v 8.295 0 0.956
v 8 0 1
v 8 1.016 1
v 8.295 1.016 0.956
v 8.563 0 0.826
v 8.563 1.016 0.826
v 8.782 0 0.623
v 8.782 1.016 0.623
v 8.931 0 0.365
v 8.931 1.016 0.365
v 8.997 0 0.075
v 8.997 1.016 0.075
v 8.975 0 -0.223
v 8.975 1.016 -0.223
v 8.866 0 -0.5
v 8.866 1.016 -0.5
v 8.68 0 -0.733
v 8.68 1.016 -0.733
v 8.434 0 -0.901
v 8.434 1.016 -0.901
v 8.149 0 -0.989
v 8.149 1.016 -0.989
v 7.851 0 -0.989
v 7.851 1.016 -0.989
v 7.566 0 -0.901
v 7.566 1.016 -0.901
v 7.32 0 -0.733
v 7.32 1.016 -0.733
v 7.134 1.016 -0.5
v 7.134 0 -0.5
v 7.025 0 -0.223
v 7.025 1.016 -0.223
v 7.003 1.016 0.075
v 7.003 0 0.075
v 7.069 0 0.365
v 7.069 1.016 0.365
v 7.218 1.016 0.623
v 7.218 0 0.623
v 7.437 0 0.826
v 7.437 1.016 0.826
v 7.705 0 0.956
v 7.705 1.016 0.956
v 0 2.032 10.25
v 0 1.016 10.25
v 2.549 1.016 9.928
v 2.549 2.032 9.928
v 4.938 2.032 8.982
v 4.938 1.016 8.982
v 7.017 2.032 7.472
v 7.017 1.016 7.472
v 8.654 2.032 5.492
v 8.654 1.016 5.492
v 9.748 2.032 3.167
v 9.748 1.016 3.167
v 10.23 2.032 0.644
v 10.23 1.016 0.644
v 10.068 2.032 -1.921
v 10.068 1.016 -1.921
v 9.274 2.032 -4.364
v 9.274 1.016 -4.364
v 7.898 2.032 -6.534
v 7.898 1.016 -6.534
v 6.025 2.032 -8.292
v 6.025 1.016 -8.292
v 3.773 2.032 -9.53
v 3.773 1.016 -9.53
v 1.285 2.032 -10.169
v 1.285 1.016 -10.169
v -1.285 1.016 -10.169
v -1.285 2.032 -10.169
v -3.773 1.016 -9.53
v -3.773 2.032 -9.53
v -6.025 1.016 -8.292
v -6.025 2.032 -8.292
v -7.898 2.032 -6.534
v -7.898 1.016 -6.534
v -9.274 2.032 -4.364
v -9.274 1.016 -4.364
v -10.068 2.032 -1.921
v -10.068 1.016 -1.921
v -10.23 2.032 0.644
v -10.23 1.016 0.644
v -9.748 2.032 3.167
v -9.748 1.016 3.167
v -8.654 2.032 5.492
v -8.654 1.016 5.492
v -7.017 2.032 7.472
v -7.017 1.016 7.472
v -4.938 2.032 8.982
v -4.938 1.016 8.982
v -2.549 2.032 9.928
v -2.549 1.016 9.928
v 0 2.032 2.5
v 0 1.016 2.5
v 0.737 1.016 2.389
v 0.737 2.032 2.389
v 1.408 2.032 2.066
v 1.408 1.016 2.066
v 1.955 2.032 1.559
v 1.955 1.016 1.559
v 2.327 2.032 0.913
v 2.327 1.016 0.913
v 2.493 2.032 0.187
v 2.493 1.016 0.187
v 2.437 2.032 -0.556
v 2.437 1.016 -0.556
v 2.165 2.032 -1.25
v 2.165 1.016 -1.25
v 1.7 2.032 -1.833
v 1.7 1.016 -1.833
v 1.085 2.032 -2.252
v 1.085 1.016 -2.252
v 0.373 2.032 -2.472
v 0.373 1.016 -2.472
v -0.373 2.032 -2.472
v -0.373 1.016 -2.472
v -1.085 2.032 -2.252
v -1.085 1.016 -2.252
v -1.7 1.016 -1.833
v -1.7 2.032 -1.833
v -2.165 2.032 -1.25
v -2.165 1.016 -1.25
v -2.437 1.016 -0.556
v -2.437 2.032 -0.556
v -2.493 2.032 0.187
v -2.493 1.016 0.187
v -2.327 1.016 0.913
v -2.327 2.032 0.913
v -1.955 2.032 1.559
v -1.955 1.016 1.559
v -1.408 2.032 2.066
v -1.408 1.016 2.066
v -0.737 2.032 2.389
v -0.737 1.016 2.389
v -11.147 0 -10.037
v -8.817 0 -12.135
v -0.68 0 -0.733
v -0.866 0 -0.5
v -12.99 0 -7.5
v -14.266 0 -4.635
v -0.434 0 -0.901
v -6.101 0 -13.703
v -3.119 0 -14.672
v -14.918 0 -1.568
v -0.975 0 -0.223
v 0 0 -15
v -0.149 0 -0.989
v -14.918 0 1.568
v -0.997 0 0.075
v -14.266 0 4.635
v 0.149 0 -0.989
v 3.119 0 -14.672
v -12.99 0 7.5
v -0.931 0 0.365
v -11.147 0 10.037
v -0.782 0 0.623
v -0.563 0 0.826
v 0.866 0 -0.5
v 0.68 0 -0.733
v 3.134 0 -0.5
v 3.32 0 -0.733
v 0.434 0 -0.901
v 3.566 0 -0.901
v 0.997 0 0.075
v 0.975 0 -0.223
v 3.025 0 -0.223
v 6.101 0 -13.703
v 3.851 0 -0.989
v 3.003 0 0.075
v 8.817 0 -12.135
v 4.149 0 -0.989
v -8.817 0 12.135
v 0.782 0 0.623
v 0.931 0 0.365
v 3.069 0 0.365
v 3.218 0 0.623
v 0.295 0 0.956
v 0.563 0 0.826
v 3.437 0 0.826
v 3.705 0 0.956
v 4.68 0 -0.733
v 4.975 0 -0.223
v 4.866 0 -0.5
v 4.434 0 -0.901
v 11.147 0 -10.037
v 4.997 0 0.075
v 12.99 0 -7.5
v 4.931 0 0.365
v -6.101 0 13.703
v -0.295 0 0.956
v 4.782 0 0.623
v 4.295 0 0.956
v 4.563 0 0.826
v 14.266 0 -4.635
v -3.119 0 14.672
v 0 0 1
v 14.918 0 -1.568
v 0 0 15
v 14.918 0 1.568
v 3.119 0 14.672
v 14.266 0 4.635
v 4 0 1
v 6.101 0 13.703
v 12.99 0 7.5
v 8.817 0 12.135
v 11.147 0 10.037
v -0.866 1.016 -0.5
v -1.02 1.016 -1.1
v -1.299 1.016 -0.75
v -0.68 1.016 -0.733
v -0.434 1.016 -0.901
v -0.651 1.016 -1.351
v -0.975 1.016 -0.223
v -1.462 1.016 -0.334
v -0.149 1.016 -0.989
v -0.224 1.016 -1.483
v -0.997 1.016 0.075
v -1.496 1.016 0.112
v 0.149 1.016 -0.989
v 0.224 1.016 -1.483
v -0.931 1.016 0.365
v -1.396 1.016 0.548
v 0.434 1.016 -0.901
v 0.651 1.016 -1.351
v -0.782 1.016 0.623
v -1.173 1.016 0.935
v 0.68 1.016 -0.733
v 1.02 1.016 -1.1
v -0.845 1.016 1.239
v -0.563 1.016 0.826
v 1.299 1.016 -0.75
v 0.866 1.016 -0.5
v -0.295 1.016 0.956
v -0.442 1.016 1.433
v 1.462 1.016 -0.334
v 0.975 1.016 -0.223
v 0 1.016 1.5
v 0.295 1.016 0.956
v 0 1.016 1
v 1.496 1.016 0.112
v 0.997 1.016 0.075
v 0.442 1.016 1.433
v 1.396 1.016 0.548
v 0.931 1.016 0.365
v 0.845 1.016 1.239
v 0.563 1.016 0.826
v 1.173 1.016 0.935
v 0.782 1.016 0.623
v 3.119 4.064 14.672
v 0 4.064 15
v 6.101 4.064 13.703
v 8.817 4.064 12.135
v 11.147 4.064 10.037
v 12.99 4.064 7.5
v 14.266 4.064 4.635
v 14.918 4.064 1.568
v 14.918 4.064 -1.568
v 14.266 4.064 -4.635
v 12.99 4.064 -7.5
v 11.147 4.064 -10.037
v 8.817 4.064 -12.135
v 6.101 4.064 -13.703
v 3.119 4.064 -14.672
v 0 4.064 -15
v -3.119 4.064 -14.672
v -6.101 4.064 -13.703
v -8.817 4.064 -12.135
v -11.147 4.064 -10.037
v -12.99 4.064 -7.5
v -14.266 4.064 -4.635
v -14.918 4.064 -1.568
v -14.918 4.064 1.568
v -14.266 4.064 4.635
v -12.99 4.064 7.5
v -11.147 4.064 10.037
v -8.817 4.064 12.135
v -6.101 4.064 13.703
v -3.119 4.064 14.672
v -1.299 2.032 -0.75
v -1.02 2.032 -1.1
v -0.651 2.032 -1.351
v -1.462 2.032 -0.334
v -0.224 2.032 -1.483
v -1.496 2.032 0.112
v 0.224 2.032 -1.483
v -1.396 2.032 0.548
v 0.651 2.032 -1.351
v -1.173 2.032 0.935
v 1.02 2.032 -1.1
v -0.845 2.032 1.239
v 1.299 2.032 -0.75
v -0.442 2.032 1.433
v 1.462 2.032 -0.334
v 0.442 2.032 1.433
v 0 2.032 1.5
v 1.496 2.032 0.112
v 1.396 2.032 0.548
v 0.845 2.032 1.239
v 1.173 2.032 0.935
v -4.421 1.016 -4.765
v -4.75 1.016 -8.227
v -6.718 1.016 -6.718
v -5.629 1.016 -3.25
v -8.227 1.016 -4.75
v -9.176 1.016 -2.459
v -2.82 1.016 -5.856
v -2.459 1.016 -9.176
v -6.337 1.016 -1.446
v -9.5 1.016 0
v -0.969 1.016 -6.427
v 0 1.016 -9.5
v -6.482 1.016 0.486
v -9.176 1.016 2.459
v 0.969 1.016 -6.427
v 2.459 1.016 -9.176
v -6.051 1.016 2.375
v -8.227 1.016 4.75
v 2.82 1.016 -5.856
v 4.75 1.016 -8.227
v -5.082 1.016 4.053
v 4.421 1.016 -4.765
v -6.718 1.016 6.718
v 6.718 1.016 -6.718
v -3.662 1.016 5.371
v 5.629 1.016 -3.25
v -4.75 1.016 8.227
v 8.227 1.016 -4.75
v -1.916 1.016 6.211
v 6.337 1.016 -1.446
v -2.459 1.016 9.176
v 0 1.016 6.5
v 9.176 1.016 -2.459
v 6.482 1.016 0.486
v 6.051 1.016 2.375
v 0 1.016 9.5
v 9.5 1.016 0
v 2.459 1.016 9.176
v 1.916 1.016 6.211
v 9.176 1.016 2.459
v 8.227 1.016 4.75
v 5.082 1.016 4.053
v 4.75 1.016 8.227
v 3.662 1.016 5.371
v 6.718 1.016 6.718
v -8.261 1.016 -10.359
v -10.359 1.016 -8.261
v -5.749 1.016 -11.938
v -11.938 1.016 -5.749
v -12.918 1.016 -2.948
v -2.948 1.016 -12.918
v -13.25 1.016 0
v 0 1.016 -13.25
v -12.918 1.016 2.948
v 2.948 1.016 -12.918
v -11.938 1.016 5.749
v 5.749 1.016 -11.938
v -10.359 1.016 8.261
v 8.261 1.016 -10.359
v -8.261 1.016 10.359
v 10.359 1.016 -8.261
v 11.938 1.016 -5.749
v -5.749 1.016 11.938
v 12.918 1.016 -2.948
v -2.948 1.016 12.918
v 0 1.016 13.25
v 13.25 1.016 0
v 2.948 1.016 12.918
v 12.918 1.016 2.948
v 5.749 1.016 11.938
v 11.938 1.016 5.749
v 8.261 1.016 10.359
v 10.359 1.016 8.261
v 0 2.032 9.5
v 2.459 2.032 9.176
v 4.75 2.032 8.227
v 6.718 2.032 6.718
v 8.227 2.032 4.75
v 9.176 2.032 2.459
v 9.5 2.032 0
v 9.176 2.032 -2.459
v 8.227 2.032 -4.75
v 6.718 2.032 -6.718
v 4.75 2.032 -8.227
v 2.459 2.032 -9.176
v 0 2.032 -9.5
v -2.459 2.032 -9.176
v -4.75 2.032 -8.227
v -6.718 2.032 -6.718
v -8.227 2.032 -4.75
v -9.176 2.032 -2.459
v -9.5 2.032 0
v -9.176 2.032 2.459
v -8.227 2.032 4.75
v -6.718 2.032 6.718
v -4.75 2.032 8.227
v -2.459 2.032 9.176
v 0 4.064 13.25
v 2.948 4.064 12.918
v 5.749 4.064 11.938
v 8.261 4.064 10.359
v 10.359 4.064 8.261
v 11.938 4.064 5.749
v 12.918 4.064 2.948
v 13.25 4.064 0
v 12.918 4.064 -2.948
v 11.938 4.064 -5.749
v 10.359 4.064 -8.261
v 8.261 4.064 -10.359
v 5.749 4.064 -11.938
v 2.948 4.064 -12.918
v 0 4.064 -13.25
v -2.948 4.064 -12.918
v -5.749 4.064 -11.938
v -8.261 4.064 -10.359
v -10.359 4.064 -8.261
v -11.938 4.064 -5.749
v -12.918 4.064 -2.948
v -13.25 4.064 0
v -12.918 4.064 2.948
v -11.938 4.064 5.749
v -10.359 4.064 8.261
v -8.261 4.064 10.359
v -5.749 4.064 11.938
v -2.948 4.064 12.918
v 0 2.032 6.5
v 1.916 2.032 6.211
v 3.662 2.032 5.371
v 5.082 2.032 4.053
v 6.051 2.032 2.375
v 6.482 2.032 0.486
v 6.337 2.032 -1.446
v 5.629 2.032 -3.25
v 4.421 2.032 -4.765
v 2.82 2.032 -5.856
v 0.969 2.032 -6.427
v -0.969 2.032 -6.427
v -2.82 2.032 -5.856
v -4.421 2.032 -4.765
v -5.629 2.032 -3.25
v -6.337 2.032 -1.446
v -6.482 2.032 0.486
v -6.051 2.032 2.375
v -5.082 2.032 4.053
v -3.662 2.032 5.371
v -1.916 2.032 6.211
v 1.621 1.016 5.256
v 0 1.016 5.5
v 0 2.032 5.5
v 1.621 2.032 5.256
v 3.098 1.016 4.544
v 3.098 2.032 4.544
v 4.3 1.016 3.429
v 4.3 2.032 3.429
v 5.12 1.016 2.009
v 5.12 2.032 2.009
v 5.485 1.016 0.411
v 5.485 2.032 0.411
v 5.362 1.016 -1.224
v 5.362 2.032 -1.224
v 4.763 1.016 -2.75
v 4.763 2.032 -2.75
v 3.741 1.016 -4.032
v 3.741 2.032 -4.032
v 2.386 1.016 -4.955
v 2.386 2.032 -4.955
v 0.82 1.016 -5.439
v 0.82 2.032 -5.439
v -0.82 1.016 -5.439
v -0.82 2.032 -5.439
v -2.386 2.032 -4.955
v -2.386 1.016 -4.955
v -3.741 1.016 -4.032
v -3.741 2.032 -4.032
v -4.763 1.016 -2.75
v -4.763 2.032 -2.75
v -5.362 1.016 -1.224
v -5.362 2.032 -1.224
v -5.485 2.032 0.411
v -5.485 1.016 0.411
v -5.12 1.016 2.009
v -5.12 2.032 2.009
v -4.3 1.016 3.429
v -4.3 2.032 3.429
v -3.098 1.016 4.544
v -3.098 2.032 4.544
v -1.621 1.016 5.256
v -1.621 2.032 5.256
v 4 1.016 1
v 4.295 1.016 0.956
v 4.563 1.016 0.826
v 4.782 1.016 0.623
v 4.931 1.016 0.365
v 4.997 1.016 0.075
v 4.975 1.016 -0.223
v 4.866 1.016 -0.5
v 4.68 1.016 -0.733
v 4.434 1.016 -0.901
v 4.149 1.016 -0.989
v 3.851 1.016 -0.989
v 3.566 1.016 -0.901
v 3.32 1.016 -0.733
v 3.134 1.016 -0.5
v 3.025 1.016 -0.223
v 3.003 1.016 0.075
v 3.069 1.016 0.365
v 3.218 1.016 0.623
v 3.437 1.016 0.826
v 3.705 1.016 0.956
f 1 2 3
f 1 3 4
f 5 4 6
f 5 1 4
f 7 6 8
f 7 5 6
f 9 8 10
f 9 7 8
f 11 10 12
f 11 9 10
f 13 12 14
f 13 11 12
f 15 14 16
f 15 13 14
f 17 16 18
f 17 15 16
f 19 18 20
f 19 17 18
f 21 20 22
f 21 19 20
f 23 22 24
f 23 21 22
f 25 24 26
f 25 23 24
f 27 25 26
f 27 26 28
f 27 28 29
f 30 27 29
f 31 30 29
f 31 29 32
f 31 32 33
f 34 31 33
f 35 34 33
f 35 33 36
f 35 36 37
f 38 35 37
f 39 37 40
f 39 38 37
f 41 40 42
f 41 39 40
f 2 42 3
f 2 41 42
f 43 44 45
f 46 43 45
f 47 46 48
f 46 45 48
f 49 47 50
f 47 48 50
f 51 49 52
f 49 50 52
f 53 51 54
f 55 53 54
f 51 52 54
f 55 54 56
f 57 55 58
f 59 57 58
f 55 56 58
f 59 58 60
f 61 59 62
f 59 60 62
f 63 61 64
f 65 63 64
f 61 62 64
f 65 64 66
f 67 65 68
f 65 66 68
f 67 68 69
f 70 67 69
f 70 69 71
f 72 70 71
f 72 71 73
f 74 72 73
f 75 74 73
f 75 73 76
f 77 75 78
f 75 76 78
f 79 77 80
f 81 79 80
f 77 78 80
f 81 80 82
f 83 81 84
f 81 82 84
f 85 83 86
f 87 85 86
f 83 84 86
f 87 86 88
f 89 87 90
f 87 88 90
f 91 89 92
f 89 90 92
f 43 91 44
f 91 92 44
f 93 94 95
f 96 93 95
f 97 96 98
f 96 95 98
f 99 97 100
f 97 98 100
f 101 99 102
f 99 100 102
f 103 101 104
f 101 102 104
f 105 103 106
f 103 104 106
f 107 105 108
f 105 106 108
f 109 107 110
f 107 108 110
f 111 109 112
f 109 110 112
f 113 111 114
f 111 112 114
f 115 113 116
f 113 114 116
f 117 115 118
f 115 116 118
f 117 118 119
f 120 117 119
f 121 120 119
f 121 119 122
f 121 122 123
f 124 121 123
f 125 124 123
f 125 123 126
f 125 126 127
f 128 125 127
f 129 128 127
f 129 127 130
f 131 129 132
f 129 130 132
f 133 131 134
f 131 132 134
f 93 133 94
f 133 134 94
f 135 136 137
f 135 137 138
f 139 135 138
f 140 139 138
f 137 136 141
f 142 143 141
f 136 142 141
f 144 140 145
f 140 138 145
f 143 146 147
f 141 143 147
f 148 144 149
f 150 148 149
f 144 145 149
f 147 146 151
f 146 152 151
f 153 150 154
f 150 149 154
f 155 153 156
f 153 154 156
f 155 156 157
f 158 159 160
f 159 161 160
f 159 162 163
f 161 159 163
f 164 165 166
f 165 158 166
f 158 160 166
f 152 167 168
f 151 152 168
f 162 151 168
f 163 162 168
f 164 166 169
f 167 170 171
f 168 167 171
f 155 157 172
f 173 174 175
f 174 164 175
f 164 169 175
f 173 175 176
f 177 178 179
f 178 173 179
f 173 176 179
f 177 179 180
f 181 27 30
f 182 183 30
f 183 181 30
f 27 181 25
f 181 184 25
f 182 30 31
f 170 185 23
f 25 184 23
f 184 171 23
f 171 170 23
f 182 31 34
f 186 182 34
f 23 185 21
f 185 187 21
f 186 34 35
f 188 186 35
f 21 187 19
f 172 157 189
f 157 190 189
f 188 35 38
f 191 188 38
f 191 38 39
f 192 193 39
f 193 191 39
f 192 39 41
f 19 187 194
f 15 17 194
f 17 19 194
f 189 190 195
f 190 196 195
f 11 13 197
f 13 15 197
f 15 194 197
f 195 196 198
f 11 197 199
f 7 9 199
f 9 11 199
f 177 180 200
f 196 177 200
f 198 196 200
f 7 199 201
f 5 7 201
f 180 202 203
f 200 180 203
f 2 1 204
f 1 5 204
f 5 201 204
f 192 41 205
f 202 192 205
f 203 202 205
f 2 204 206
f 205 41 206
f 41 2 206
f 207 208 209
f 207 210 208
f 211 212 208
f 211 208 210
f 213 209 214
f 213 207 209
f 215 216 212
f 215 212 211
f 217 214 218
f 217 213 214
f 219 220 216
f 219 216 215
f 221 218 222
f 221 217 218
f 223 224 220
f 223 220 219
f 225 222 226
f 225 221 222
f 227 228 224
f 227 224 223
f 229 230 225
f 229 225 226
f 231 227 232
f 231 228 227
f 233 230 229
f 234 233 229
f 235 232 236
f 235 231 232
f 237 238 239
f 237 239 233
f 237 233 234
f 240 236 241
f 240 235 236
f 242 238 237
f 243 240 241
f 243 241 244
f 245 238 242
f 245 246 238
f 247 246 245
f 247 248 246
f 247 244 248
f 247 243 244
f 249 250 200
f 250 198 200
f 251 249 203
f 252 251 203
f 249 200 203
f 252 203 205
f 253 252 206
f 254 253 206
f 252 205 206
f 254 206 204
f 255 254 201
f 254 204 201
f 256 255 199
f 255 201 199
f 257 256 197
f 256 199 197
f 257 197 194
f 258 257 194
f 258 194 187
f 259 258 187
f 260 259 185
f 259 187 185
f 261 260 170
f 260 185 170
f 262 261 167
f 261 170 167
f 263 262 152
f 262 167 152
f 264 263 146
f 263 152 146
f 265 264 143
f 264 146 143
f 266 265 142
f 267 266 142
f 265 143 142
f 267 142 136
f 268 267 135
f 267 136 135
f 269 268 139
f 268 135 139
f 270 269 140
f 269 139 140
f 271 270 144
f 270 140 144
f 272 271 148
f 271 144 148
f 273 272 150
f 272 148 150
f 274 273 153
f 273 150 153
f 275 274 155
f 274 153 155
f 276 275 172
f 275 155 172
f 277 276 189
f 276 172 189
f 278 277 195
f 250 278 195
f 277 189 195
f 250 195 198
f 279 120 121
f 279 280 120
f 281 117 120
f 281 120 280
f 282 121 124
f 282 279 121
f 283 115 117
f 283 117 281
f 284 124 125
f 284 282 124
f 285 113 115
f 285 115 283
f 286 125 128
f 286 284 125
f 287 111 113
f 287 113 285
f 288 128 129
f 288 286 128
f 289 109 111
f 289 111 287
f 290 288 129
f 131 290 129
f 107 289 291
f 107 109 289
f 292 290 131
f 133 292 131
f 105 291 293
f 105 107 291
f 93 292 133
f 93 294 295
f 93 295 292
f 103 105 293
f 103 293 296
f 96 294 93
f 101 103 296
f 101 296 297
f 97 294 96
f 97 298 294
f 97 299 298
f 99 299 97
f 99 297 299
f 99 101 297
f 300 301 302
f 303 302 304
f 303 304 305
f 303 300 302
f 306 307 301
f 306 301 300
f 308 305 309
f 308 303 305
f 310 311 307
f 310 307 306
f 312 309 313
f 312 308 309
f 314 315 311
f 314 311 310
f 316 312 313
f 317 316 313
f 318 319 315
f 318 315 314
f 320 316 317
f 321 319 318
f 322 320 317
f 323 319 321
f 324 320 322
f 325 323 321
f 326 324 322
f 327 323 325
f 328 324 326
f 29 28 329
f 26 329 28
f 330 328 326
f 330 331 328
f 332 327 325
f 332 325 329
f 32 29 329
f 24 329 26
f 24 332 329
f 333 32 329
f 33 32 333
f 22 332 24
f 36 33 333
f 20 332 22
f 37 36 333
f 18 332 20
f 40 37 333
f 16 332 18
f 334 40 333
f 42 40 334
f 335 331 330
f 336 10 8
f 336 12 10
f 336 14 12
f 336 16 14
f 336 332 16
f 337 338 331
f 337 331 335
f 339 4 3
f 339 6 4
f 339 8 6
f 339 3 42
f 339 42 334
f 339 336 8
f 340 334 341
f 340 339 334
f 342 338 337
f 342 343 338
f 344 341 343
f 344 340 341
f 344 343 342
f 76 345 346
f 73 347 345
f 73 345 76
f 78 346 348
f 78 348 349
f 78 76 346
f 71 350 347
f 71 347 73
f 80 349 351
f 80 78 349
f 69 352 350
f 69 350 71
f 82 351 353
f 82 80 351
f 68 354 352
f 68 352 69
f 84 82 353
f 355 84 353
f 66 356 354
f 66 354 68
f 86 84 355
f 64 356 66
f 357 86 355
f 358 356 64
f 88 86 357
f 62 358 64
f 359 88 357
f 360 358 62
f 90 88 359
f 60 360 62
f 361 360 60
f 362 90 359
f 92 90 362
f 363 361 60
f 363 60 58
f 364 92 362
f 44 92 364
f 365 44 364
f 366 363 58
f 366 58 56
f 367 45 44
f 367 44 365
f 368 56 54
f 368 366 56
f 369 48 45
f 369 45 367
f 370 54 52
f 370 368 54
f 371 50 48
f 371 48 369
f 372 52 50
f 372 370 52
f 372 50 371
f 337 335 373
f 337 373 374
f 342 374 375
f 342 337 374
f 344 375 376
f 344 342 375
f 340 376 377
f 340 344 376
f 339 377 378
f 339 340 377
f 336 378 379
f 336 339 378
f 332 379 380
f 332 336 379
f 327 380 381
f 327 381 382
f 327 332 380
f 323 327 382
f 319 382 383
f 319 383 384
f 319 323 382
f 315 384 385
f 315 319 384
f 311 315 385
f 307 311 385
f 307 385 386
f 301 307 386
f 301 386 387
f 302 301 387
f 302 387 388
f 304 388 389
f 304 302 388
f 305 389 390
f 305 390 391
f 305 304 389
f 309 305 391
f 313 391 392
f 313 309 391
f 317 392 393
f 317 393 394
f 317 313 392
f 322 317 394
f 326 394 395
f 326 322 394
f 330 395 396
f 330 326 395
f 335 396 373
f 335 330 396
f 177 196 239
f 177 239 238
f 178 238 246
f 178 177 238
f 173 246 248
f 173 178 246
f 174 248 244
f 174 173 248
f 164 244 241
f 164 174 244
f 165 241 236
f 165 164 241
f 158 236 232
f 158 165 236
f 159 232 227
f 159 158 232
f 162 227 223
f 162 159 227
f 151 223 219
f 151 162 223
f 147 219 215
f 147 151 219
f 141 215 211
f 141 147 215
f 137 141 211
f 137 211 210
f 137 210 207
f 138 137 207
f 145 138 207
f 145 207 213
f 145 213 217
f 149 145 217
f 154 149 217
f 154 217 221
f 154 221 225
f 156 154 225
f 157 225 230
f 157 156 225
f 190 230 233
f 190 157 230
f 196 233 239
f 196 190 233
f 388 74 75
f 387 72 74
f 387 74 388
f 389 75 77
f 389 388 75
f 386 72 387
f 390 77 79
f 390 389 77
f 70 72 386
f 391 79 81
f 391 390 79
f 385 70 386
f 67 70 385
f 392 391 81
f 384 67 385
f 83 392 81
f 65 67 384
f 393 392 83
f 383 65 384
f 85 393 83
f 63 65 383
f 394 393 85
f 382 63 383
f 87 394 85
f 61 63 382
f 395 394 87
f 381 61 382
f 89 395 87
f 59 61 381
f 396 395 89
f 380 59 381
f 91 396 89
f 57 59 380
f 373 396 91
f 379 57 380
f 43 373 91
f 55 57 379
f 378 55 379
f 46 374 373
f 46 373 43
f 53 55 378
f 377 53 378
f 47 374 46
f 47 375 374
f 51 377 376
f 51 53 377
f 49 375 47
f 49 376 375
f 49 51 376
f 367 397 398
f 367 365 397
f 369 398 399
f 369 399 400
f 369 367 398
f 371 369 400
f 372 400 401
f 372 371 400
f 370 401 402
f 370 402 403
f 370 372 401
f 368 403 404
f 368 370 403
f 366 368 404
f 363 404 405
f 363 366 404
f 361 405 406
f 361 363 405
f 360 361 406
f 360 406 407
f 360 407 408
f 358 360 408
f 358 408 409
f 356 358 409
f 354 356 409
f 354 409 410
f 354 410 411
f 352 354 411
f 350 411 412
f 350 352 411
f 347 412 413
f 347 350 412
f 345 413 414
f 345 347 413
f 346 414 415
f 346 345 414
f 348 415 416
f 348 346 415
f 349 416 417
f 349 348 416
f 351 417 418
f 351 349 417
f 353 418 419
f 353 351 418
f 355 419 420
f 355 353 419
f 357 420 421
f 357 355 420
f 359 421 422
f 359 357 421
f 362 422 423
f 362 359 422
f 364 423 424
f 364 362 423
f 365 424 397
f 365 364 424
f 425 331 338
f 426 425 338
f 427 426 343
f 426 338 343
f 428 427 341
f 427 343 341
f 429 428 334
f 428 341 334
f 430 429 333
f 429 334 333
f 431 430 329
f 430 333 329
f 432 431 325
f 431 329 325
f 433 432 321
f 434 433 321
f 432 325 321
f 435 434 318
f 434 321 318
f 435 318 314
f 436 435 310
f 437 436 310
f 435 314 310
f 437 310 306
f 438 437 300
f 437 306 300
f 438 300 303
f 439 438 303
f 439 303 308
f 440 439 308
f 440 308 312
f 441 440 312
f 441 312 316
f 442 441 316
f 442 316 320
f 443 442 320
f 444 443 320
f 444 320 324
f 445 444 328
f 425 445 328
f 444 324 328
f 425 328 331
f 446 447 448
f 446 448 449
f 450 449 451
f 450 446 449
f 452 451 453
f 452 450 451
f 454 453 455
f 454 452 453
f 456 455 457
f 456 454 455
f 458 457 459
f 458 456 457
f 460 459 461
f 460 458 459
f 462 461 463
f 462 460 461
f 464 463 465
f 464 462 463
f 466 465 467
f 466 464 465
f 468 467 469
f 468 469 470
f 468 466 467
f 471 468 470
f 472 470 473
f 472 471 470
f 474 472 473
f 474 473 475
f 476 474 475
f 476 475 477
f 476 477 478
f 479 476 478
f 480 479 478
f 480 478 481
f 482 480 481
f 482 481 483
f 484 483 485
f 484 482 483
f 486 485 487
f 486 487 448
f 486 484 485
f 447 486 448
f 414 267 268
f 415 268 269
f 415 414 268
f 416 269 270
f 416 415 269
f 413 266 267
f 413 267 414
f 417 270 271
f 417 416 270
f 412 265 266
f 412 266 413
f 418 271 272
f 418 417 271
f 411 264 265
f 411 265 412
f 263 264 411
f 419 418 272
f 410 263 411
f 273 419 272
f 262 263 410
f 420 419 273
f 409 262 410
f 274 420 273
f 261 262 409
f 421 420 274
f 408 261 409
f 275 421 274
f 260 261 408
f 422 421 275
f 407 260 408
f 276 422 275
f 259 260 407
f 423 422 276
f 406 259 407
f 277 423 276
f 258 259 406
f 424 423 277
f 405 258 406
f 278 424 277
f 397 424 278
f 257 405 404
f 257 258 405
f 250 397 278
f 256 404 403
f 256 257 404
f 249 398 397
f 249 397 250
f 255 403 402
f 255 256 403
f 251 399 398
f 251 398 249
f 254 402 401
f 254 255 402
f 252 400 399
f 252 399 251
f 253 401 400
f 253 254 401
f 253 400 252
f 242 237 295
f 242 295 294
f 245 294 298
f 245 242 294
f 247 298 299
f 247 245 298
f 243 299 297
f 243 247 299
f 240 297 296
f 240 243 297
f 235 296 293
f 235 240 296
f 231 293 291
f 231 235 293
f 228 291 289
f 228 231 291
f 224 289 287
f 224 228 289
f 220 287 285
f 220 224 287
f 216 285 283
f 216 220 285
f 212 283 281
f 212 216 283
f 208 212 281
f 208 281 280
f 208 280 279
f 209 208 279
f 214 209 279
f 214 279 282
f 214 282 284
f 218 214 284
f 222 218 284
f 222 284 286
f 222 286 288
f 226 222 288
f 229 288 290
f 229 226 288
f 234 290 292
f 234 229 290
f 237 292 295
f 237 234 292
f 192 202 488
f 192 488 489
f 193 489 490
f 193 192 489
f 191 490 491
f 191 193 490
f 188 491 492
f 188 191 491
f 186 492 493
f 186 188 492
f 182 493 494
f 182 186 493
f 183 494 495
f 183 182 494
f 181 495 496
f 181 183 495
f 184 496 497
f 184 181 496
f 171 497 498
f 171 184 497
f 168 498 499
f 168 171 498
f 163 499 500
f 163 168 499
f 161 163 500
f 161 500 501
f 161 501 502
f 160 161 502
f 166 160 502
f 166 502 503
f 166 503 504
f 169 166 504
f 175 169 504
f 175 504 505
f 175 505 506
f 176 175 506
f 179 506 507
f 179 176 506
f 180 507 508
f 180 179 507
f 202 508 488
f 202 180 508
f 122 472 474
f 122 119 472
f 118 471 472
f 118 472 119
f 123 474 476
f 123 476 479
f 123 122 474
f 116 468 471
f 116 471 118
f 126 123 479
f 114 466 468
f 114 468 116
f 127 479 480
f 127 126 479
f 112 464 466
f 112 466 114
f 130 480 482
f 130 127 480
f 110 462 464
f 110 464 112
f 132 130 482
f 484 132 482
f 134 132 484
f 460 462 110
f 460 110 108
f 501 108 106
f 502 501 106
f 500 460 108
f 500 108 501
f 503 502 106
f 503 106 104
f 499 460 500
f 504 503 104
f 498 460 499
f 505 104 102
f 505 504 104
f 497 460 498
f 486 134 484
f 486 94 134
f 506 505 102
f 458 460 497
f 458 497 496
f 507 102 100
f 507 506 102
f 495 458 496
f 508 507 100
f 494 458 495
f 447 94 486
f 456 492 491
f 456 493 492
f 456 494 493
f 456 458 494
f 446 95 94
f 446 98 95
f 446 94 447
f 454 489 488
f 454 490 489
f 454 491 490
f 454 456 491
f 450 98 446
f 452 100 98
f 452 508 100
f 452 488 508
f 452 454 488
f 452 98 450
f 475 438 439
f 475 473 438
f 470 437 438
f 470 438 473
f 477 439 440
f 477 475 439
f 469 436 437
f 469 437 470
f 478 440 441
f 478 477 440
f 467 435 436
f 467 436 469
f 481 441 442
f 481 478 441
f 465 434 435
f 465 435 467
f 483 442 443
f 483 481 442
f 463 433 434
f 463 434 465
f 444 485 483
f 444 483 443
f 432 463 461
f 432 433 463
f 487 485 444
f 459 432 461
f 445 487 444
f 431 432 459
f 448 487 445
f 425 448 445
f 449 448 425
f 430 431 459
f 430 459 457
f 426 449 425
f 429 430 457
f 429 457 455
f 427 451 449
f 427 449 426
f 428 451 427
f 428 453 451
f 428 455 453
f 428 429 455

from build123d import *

# Parameters (mm, degrees)
SKETCH2_R           = 15
SKETCH2_R_2         = 1
BOSS_EXTRUDE2_DEPTH = 1.016
SKETCH3_R           = 15
SKETCH3_R_2         = 13.25
SKETCH3_R_3         = 10.25
SKETCH3_R_4         = 9.5
SKETCH3_R_5         = 6.5
SKETCH3_R_6         = 5.5
SKETCH3_R_7         = 2.5
SKETCH3_R_8         = 1.5
BOSS_EXTRUDE4_DEPTH = 1.016
SKETCH5_R           = 15
SKETCH5_R_2         = 13.25
BOSS_EXTRUDE5_DEPTH = 2.032


with BuildPart() as part:
    # Sketch2 → Boss-Extrude2 (new body)
    with BuildSketch(Plane(origin=(0, 0, 0), x_dir=(1, 0, 0), z_dir=(0, 1, 0))):
        with Locations(Location((0, 0, 0), (0, 0, 270))):
            Circle(SKETCH2_R)
        with Locations(Location((0, 0, 0), (0, 0, 270))):
            Circle(SKETCH2_R_2, mode=Mode.SUBTRACT)
        with Locations(Location((4, 0, 0), (0, 0, 270))):
            Circle(SKETCH2_R_2, mode=Mode.SUBTRACT)
        with Locations(Location((8, 0, 0), (0, 0, 270))):
            Circle(SKETCH2_R_2, mode=Mode.SUBTRACT)
    extrude(amount=BOSS_EXTRUDE2_DEPTH)

    # Sketch3 → Boss-Extrude4 (add)
    # profile 1 of 4: a face of its own
    with BuildSketch(Plane(origin=(0, 1.016, 0), x_dir=(1, 0, 0), z_dir=(0, 1, 0))):
        with Locations(Location((0, 0, 0), (0, 0, 270))):
            Circle(SKETCH3_R)
        with Locations(Location((0, 0, 0), (0, 0, 270))):
            Circle(SKETCH3_R_2, mode=Mode.SUBTRACT)
    # profile 2 of 4: a face of its own
    with BuildSketch(Plane(origin=(0, 1.016, 0), x_dir=(1, 0, 0), z_dir=(0, 1, 0))):
        with Locations(Location((0, 0, 0), (0, 0, 270))):
            Circle(SKETCH3_R_3)
        with Locations(Location((0, 0, 0), (0, 0, 270))):
            Circle(SKETCH3_R_4, mode=Mode.SUBTRACT)
    # profile 3 of 4: a face of its own
    with BuildSketch(Plane(origin=(0, 1.016, 0), x_dir=(1, 0, 0), z_dir=(0, 1, 0))):
        with Locations(Location((0, 0, 0), (0, 0, 270))):
            Circle(SKETCH3_R_5)
        with Locations(Location((0, 0, 0), (0, 0, 270))):
            Circle(SKETCH3_R_6, mode=Mode.SUBTRACT)
    # profile 4 of 4: a face of its own
    with BuildSketch(Plane(origin=(0, 1.016, 0), x_dir=(1, 0, 0), z_dir=(0, 1, 0))):
        with Locations(Location((0, 0, 0), (0, 0, 270))):
            Circle(SKETCH3_R_7)
        with Locations(Location((0, 0, 0), (0, 0, 270))):
            Circle(SKETCH3_R_8, mode=Mode.SUBTRACT)
    extrude(amount=BOSS_EXTRUDE4_DEPTH)

    # Sketch5 → Boss-Extrude5 (add)
    with BuildSketch(Plane(origin=(0, 2.032, 0), x_dir=(1, 0, 0), z_dir=(0, 1, 0))):
        with Locations(Location((0, 0, 0), (0, 0, 270))):
            Circle(SKETCH5_R)
        with Locations(Location((0, 0, 0), (0, 0, 270))):
            Circle(SKETCH5_R_2, mode=Mode.SUBTRACT)
    extrude(amount=BOSS_EXTRUDE5_DEPTH)


solid = part.part
